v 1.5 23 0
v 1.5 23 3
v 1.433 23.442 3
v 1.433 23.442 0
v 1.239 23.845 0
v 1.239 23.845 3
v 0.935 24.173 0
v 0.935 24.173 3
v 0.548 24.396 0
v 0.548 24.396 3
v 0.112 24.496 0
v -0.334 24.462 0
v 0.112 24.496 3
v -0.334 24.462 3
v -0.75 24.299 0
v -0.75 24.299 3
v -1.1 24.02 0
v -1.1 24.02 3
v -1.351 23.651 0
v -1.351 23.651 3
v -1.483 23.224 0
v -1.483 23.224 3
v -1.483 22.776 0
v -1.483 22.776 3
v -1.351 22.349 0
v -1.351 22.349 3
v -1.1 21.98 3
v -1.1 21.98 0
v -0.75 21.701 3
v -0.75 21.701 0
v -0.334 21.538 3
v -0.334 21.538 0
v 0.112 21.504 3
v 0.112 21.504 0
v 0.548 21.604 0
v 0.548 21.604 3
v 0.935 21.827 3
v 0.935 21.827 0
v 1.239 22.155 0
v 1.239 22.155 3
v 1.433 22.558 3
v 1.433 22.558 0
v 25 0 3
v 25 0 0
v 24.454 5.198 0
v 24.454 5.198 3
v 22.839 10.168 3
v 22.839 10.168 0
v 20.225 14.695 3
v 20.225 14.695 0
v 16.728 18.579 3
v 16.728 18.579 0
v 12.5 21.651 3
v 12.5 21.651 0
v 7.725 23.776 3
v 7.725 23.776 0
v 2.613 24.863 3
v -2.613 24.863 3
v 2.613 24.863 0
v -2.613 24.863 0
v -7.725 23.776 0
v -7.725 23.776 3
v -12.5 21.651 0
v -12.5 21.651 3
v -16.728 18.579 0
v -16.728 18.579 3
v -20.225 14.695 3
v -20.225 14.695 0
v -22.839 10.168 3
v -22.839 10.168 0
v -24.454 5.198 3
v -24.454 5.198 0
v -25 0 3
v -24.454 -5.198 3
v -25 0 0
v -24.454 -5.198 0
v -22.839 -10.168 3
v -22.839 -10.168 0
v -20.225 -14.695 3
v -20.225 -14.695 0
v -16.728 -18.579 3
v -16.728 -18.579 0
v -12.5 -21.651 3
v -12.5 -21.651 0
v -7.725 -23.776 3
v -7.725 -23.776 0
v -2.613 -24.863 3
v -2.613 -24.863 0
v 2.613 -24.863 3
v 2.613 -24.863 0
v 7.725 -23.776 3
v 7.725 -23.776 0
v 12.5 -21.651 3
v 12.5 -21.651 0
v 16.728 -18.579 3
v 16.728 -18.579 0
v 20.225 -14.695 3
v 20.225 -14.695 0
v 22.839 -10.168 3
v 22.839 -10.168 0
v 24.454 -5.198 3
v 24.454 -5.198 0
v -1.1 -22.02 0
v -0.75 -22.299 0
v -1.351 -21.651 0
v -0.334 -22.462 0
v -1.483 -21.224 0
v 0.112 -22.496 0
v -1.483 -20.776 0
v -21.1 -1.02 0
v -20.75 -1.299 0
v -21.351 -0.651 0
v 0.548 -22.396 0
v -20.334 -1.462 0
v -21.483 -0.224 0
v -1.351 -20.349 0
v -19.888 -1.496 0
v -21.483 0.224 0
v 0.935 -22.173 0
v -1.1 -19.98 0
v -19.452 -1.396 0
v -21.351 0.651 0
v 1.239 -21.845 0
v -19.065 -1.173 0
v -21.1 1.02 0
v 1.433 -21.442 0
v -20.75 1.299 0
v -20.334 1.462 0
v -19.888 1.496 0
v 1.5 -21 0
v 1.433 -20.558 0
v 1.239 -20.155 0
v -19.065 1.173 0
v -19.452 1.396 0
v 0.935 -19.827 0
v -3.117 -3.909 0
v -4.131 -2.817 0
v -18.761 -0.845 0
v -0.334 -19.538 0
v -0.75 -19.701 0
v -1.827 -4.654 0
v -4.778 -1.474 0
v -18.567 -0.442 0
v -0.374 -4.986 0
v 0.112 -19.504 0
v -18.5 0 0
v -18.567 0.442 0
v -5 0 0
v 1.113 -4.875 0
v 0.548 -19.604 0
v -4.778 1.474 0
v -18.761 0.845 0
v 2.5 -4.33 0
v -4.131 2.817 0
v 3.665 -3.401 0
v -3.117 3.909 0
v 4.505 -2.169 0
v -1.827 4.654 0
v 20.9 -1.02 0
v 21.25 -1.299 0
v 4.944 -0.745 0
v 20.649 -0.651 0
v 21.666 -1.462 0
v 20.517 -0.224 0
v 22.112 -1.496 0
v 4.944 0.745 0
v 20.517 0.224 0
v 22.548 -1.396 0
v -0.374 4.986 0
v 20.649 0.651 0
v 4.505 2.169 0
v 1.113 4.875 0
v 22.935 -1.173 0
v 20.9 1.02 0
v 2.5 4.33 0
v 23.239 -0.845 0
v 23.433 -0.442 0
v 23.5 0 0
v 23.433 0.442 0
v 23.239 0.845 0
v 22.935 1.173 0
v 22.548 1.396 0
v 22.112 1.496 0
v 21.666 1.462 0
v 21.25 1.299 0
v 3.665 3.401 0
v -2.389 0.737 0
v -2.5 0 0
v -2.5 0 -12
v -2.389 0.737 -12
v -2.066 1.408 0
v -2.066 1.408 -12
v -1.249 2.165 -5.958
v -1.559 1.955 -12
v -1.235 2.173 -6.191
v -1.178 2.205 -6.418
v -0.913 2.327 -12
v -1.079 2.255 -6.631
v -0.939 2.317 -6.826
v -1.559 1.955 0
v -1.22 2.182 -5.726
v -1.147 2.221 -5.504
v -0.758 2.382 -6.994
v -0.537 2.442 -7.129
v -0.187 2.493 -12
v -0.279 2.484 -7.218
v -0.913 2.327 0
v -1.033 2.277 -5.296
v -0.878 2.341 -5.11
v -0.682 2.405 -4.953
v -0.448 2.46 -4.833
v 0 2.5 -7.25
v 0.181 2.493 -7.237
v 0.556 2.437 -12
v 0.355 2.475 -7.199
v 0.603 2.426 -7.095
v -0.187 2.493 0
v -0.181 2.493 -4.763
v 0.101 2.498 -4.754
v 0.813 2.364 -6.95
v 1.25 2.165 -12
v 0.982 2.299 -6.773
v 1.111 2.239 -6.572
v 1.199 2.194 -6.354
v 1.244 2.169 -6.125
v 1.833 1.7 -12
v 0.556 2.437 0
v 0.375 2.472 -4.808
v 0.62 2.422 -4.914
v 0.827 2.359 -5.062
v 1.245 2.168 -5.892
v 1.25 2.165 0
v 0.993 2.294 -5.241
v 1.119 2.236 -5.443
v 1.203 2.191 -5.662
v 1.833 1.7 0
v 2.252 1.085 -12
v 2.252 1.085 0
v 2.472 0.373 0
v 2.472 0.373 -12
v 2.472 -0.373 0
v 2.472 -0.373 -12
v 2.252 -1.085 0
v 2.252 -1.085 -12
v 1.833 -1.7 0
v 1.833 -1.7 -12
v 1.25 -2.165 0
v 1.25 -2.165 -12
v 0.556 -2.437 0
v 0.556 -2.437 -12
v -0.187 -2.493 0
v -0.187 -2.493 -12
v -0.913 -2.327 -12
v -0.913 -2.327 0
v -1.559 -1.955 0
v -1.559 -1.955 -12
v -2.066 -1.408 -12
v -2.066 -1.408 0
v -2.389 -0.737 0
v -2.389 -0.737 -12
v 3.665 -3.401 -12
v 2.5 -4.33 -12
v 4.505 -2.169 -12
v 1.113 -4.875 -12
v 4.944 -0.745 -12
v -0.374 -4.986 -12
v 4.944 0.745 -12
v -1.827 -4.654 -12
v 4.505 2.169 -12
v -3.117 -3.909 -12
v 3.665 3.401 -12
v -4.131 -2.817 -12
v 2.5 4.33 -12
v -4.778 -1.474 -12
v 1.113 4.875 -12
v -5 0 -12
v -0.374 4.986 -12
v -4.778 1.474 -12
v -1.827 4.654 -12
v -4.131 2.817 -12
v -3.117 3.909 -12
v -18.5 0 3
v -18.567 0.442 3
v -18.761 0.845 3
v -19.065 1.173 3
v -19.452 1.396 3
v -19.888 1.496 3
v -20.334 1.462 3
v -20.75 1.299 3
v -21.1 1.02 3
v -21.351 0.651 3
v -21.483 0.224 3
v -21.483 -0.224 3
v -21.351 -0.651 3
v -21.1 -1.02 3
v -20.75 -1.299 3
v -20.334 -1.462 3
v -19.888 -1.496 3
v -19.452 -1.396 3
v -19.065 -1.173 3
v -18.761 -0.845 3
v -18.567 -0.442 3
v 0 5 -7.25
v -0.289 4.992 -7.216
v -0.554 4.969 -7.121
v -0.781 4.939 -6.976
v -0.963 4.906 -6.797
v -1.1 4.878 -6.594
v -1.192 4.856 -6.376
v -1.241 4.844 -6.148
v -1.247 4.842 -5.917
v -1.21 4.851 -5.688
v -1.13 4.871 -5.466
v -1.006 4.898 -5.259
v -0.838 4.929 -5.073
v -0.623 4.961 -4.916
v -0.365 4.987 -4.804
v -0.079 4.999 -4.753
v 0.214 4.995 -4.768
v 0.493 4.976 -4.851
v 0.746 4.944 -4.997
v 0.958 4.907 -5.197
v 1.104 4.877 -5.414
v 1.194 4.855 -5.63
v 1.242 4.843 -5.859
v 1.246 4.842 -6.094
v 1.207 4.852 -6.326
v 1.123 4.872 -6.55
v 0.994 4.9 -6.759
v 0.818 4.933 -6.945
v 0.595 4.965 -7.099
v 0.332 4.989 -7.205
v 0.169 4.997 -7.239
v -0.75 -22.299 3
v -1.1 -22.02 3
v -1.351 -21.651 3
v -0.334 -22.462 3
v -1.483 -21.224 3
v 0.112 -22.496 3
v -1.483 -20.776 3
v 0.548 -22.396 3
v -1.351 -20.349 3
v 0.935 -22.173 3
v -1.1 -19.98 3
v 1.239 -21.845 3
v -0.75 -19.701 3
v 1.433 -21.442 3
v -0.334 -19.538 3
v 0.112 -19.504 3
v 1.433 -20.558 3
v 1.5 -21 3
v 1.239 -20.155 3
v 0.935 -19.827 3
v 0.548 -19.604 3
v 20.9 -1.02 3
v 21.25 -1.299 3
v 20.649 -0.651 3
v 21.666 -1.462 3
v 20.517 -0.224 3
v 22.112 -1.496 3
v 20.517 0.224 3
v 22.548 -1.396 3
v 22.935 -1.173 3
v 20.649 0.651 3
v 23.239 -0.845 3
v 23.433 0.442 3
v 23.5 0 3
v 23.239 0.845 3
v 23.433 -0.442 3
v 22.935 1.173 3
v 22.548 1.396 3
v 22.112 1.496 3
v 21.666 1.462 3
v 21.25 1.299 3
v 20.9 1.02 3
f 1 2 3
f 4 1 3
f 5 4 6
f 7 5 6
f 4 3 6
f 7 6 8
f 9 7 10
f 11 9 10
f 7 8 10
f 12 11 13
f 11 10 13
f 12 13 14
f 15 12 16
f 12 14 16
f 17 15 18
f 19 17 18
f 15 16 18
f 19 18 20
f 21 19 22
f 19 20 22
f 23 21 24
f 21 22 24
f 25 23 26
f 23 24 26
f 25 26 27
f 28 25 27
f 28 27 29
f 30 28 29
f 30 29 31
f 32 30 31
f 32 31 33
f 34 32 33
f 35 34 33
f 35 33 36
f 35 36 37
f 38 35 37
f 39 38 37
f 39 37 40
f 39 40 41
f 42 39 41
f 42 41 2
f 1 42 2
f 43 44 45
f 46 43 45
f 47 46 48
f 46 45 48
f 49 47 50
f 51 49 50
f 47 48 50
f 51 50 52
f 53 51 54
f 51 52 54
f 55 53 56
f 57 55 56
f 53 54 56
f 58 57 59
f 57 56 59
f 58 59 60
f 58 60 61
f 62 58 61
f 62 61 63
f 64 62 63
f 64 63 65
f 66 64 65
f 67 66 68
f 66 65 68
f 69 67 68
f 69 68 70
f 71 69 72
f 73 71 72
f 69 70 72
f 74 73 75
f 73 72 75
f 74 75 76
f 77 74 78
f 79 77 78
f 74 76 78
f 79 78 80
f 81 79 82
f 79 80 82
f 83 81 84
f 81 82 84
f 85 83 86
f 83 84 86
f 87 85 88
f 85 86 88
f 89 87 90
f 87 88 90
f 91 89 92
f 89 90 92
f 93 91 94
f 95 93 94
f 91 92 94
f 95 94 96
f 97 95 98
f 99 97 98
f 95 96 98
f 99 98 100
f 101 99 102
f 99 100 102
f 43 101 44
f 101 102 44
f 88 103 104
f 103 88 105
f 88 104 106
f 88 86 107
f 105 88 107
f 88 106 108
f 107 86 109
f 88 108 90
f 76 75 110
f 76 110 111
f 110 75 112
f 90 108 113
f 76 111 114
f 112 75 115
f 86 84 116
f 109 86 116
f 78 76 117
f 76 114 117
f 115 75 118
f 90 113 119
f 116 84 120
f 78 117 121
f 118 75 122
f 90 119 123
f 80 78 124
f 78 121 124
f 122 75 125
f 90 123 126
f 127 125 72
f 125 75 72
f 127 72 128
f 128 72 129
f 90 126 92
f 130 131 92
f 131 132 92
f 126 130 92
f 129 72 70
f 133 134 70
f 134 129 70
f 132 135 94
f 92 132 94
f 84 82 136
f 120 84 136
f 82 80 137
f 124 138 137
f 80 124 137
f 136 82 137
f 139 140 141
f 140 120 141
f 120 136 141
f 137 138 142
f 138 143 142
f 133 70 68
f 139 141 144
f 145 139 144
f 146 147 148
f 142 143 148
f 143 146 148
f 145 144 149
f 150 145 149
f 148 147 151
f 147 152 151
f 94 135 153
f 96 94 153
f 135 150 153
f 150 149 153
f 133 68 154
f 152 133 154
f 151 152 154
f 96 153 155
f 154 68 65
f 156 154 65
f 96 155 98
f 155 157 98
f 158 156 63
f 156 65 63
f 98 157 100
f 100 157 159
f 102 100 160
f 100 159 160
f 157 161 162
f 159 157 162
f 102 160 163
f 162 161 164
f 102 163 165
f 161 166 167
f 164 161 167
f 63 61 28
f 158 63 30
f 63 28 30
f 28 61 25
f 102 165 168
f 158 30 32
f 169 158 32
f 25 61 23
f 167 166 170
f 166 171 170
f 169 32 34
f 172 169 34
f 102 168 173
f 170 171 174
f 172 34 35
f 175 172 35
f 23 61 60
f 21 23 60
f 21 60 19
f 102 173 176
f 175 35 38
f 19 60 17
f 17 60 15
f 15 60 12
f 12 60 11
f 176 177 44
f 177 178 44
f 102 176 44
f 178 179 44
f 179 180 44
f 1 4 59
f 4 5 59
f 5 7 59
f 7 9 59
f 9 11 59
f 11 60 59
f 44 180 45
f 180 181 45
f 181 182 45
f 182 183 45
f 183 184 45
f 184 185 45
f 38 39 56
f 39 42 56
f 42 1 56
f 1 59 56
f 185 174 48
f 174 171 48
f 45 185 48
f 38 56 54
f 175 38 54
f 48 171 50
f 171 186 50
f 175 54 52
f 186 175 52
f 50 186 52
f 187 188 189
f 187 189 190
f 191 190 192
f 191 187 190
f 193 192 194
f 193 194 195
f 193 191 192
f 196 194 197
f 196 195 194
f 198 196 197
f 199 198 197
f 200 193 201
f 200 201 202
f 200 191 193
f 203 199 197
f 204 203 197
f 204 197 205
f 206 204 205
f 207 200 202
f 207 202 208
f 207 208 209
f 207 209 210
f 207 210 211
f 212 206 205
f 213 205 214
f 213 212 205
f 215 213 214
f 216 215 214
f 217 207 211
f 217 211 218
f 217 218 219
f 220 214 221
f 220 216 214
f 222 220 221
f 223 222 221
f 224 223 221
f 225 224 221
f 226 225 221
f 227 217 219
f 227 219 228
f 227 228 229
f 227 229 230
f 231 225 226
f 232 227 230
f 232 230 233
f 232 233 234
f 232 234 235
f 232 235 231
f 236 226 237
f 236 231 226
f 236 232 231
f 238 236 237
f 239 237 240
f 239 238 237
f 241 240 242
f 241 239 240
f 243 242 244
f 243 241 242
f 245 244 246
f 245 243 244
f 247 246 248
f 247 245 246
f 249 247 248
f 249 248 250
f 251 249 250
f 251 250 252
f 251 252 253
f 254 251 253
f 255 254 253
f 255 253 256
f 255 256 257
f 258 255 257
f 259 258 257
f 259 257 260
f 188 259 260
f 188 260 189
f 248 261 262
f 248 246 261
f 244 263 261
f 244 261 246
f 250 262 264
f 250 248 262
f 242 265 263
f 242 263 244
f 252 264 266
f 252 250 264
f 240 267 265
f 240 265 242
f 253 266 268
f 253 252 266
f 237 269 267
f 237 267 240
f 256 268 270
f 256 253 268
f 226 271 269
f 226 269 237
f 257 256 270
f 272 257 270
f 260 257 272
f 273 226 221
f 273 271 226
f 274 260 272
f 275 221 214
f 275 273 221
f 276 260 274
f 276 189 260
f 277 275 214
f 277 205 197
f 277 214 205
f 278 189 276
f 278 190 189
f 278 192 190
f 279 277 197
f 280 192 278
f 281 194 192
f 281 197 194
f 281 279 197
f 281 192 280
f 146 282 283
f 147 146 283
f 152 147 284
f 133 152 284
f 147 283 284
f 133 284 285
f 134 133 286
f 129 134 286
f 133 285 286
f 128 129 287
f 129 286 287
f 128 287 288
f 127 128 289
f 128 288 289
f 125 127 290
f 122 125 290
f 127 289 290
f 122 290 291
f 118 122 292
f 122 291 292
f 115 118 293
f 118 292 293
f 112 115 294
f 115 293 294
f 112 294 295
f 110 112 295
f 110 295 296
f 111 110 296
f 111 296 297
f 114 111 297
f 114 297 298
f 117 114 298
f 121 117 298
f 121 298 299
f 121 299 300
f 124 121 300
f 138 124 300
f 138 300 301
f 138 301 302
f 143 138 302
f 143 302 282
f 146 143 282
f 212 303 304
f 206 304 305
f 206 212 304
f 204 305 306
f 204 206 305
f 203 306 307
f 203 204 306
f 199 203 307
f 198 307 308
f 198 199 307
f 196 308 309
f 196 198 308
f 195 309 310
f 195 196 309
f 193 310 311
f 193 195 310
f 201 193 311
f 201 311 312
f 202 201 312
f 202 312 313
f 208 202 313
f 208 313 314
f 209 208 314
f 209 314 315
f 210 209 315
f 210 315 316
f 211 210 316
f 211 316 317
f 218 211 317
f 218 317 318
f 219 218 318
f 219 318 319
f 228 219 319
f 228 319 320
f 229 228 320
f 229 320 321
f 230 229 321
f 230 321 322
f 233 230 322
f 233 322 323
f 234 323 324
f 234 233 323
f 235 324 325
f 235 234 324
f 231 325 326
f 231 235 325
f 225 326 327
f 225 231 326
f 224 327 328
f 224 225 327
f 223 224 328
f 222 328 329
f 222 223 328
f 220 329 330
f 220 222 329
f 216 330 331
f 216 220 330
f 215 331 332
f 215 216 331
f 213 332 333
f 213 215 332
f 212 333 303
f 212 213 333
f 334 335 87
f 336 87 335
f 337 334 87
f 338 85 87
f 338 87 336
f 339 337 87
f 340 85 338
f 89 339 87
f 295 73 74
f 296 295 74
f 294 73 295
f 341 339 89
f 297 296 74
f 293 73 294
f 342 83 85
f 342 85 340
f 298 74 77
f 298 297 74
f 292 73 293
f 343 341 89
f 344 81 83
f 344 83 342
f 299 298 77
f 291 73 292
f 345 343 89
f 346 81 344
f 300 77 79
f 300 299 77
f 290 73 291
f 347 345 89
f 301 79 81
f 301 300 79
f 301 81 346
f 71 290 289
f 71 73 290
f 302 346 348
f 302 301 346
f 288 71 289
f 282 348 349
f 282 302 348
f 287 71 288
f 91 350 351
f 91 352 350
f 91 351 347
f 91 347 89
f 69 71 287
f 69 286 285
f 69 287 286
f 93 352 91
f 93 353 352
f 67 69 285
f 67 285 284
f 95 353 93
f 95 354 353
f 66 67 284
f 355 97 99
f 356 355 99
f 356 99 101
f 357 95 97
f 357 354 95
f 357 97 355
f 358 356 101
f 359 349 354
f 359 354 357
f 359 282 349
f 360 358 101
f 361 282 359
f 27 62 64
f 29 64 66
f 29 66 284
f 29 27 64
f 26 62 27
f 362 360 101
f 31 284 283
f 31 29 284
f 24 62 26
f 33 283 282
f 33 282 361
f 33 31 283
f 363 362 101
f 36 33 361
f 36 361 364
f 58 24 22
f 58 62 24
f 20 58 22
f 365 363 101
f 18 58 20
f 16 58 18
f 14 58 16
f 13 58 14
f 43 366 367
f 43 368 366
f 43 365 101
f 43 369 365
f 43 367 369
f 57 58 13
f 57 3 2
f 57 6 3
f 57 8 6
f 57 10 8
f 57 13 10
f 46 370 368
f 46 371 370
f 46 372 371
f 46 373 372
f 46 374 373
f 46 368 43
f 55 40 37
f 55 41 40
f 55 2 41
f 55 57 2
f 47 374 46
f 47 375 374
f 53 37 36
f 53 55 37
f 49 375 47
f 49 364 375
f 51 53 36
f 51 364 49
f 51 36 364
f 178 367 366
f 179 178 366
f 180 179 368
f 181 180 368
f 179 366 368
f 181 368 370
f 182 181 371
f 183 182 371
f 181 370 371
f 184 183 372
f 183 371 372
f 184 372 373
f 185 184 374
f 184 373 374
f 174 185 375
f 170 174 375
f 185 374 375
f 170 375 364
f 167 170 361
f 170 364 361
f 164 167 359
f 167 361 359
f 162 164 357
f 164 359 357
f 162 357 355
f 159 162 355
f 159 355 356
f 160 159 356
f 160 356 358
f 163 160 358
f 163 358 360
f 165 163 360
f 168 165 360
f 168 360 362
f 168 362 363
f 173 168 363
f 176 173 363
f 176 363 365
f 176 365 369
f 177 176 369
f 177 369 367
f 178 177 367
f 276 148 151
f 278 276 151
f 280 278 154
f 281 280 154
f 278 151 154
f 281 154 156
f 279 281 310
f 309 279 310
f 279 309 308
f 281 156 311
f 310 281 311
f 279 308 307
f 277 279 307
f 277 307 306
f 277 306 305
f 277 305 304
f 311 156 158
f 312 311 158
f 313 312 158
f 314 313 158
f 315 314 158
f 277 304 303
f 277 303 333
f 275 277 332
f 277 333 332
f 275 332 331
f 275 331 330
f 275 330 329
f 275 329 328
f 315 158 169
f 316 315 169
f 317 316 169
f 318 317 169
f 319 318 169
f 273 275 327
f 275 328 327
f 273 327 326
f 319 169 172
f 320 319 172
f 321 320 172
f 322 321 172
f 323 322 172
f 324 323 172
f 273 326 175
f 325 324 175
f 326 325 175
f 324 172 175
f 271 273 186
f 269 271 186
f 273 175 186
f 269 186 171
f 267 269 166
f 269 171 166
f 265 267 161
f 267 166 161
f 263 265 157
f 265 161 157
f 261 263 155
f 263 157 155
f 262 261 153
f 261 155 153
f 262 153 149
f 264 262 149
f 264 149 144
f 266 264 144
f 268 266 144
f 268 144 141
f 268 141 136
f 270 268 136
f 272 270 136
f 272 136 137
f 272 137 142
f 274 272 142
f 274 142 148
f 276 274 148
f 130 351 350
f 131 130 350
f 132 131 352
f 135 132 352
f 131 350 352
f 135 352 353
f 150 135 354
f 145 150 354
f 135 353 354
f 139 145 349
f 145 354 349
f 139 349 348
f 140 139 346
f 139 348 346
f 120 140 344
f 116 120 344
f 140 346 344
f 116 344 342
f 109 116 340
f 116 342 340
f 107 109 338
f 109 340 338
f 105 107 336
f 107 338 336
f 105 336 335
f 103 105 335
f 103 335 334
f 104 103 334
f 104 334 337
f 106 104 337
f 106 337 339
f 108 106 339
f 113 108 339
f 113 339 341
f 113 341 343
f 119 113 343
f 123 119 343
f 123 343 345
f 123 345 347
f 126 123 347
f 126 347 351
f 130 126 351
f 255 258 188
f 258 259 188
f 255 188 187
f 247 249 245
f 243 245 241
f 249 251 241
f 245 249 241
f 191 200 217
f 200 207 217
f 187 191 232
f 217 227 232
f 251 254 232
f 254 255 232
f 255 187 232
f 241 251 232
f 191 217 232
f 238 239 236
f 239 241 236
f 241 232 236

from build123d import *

# Parameters (mm, degrees)
SZKIC1_R                        = 25
DODANIE_WYCI_GNI_CIE1_DEPTH     = 3
SZKIC2_R                        = 5
SZKIC2_R_2                      = 2.5
DODANIE_WYCI_GNI_CIE2_DEPTH     = 12
WYTNIJ_WYCI_GNI_CIE1_REACH      = 39.336
WYTNIJ_WYCI_GNI_CIE1_END_RADIUS = 5
SZKIC3_R                        = 1.25
WYTNIJ_WYCI_GNI_CIE2_REACH      = 40.406
SZKIC4_R                        = 1.5


with BuildPart() as part:
    # Szkic1 → Dodanie-wyciągnięcie1 (new body)
    with BuildSketch(Plane.XY):
        Circle(SZKIC1_R)
    extrude(amount=DODANIE_WYCI_GNI_CIE1_DEPTH)

    # Szkic2 → Dodanie-wyciągnięcie2 (add)
    with BuildSketch(Plane(origin=(0, 0, 0), x_dir=(-1, 0, 0), z_dir=(0, 0, -1))):
        Circle(SZKIC2_R)
        Circle(SZKIC2_R_2, mode=Mode.SUBTRACT)
    extrude(amount=DODANIE_WYCI_GNI_CIE2_DEPTH)

    # Wytnij-wyciągnięcie1: up to this cylinder (the profile starts inside it)
    wytnij_wyci_gni_cie1_end = Plane(origin=(0, 0, -6), z_dir=(0, 0, 1)) * Cylinder(WYTNIJ_WYCI_GNI_CIE1_END_RADIUS, 89.672, mode=Mode.PRIVATE)
    # Szkic3 → Wytnij-wyciągnięcie1 (cut, up to the surface)
    with BuildSketch(Plane(origin=(0, 0, 0), x_dir=(1, 0, 0), z_dir=(0, 1, 0)), mode=Mode.PRIVATE) as wytnij_wyci_gni_cie1_sk1:
        with Locations(Location((0, 6, 0), (0, 0, 90))):
            Circle(SZKIC3_R)
    wytnij_wyci_gni_cie1_tool1 = extrude(wytnij_wyci_gni_cie1_sk1.sketch, amount=WYTNIJ_WYCI_GNI_CIE1_REACH, mode=Mode.PRIVATE) & wytnij_wyci_gni_cie1_end
    add(wytnij_wyci_gni_cie1_tool1.solids().sort_by_distance((0, 0, -6))[0], mode=Mode.SUBTRACT)

    # Szkic4 → Wytnij-wyciągnięcie2 (cut, up to next)
    with BuildSketch(Plane.XY.offset(3), mode=Mode.PRIVATE) as wytnij_wyci_gni_cie2_sk1:
        with Locations((22, 0)):
            Circle(SZKIC4_R)
    wytnij_wyci_gni_cie2_tool1 = extrude(wytnij_wyci_gni_cie2_sk1.sketch, amount=-WYTNIJ_WYCI_GNI_CIE2_REACH, mode=Mode.PRIVATE) & part.part
    # Szkic4 → Wytnij-wyciągnięcie2 (cut, up to next)
    with BuildSketch(Plane.XY.offset(3), mode=Mode.PRIVATE) as wytnij_wyci_gni_cie2_sk2:
        with Locations((-20, 0)):
            Circle(SZKIC4_R)
    wytnij_wyci_gni_cie2_tool2 = extrude(wytnij_wyci_gni_cie2_sk2.sketch, amount=-WYTNIJ_WYCI_GNI_CIE2_REACH, mode=Mode.PRIVATE) & part.part
    # Szkic4 → Wytnij-wyciągnięcie2 (cut, up to next)
    with BuildSketch(Plane.XY.offset(3), mode=Mode.PRIVATE) as wytnij_wyci_gni_cie2_sk3:
        with Locations((0, -21)):
            Circle(SZKIC4_R)
    wytnij_wyci_gni_cie2_tool3 = extrude(wytnij_wyci_gni_cie2_sk3.sketch, amount=-WYTNIJ_WYCI_GNI_CIE2_REACH, mode=Mode.PRIVATE) & part.part
    # Szkic4 → Wytnij-wyciągnięcie2 (cut, up to next)
    with BuildSketch(Plane.XY.offset(3), mode=Mode.PRIVATE) as wytnij_wyci_gni_cie2_sk4:
        with Locations((0, 23)):
            Circle(SZKIC4_R)
    wytnij_wyci_gni_cie2_tool4 = extrude(wytnij_wyci_gni_cie2_sk4.sketch, amount=-WYTNIJ_WYCI_GNI_CIE2_REACH, mode=Mode.PRIVATE) & part.part
    add(wytnij_wyci_gni_cie2_tool1.solids().sort_by_distance((22, 0, 3))[0], mode=Mode.SUBTRACT)
    add(wytnij_wyci_gni_cie2_tool2.solids().sort_by_distance((-20, 0, 3))[0], mode=Mode.SUBTRACT)
    add(wytnij_wyci_gni_cie2_tool3.solids().sort_by_distance((0, -21, 3))[0], mode=Mode.SUBTRACT)
    add(wytnij_wyci_gni_cie2_tool4.solids().sort_by_distance((0, 23, 3))[0], mode=Mode.SUBTRACT)


solid = part.part
